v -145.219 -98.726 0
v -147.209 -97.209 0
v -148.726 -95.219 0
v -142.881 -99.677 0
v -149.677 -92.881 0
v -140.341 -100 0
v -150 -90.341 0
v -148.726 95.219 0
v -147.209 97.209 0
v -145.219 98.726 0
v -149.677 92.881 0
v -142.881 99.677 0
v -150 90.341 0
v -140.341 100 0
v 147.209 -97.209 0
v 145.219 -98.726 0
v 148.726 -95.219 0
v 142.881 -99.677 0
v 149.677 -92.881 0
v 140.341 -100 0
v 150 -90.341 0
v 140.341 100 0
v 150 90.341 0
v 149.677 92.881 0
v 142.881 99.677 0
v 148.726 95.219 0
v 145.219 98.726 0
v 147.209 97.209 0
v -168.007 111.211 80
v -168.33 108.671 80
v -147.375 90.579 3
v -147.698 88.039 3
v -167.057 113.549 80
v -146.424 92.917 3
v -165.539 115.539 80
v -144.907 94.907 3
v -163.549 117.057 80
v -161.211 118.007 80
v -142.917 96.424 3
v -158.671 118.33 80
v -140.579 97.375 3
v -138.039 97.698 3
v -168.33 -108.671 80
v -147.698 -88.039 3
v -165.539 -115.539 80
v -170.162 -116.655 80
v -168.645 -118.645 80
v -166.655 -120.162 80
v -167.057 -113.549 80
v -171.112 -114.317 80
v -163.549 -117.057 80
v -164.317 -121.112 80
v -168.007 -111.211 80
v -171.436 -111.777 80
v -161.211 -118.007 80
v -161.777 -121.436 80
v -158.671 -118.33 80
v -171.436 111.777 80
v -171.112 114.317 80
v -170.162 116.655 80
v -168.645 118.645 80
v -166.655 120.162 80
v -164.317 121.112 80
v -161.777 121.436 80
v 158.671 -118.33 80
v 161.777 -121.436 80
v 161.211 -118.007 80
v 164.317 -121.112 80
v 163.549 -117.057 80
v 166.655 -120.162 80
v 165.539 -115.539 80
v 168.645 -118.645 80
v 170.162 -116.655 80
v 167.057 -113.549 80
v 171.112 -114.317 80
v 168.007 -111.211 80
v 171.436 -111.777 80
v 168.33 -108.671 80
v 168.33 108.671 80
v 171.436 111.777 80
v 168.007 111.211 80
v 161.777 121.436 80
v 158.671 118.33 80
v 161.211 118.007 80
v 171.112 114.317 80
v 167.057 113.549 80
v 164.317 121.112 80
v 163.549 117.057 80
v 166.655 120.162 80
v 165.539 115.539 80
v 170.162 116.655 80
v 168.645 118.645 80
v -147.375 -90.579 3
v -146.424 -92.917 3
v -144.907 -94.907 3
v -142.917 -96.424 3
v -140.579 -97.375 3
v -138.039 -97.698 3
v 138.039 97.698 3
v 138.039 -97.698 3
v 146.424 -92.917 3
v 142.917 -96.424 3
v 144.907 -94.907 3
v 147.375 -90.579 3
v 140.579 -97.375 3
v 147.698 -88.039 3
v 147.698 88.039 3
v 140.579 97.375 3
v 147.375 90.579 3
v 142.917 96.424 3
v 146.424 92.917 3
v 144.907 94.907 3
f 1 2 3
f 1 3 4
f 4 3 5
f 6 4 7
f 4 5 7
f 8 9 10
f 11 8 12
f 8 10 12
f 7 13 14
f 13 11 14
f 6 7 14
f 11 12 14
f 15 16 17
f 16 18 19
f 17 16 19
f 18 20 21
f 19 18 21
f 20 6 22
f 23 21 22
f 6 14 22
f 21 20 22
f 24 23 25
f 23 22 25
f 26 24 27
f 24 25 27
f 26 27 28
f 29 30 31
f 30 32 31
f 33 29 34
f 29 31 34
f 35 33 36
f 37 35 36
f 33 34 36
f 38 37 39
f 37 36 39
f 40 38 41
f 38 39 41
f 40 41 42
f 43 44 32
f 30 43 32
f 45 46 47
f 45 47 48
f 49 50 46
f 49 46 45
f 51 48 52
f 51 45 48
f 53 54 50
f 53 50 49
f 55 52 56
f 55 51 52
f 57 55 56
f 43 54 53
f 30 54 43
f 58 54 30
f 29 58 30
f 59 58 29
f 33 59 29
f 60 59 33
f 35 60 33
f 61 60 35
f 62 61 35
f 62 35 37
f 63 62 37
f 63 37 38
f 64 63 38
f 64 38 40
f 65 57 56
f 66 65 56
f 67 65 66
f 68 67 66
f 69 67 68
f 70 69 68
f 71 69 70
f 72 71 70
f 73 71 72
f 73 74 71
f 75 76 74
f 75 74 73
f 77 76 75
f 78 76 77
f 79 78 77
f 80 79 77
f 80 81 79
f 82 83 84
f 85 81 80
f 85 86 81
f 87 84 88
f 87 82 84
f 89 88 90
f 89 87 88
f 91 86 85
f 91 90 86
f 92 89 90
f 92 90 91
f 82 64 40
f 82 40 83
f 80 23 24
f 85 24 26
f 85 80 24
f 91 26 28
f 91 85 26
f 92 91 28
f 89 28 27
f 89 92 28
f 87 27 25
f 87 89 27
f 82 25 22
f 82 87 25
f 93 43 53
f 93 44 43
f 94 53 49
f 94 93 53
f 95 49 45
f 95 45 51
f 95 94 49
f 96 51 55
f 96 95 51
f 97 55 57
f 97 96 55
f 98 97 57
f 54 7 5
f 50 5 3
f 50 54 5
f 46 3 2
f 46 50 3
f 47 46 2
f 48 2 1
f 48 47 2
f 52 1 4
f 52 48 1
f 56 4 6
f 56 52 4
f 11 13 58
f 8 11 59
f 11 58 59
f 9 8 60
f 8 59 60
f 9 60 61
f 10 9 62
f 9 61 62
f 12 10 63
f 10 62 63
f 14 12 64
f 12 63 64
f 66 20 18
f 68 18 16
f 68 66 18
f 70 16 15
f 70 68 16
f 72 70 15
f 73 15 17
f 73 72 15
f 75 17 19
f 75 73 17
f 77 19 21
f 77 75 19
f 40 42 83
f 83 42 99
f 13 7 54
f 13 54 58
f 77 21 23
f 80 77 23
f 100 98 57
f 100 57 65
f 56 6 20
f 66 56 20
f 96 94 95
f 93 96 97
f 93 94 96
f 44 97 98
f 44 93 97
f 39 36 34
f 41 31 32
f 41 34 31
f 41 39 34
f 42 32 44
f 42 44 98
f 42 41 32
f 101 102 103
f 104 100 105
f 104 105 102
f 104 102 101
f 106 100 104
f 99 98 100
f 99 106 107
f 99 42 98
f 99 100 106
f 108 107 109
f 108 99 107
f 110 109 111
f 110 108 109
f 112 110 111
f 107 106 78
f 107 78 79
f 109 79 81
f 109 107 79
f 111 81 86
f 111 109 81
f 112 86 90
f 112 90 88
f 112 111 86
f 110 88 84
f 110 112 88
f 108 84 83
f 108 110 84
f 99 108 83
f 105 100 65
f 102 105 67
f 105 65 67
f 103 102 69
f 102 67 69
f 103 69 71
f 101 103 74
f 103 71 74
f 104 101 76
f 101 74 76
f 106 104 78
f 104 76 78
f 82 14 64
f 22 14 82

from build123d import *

# Parameters (mm, degrees)
SKETCH_1_W      = 300
SKETCH_1_H      = 200
EXTRUDE_1_DEPTH = 80
EXTRUDE_1_DRAFT = -15
SHELL_1_T       = -3
FILLET_1_R      = 10


with BuildPart() as part:
    # 草图1 → 凸台-拉伸1 (with draft: the straight prism first)
    with BuildSketch(Plane.XY):
        Rectangle(SKETCH_1_W, SKETCH_1_H)
    extrude(amount=EXTRUDE_1_DEPTH)
    # 凸台-拉伸1: the draft: its side faces are tilted about the plane it starts from
    extrude_1_sides = [part.faces().sort_by_distance(p)[0] for p in [
        (0, -100, 40),
        (150, 0, 40),
        (0, 100, 40),
        (-150, 0, 40),
    ]]
    draft(extrude_1_sides, Plane.XY, EXTRUDE_1_DRAFT)

    # 抽壳1
    shell_1_openings = [part.faces().sort_by_distance(p)[0] for p in [
        (0, 0, 80),
    ]]
    offset(amount=SHELL_1_T, openings=shell_1_openings, kind=Kind.INTERSECTION)

    # 圆角1
    fillet_1_edges = [part.edges().sort_by_distance(p)[0] for p in [
        (158.014062945, -108.014062945, 41.5),
        (158.014062945, 108.014062945, 41.5),
        (-158.014062945, 108.014062945, 41.5),
        (-158.014062945, -108.014062945, 41.5),
        (160.717967697, -110.717967697, 40),
        (-160.717967697, -110.717967697, 40),
        (-160.717967697, 110.717967697, 40),
        (160.717967697, 110.717967697, 40),
    ]]
    fillet(fillet_1_edges, radius=FILLET_1_R)


solid = part.part
